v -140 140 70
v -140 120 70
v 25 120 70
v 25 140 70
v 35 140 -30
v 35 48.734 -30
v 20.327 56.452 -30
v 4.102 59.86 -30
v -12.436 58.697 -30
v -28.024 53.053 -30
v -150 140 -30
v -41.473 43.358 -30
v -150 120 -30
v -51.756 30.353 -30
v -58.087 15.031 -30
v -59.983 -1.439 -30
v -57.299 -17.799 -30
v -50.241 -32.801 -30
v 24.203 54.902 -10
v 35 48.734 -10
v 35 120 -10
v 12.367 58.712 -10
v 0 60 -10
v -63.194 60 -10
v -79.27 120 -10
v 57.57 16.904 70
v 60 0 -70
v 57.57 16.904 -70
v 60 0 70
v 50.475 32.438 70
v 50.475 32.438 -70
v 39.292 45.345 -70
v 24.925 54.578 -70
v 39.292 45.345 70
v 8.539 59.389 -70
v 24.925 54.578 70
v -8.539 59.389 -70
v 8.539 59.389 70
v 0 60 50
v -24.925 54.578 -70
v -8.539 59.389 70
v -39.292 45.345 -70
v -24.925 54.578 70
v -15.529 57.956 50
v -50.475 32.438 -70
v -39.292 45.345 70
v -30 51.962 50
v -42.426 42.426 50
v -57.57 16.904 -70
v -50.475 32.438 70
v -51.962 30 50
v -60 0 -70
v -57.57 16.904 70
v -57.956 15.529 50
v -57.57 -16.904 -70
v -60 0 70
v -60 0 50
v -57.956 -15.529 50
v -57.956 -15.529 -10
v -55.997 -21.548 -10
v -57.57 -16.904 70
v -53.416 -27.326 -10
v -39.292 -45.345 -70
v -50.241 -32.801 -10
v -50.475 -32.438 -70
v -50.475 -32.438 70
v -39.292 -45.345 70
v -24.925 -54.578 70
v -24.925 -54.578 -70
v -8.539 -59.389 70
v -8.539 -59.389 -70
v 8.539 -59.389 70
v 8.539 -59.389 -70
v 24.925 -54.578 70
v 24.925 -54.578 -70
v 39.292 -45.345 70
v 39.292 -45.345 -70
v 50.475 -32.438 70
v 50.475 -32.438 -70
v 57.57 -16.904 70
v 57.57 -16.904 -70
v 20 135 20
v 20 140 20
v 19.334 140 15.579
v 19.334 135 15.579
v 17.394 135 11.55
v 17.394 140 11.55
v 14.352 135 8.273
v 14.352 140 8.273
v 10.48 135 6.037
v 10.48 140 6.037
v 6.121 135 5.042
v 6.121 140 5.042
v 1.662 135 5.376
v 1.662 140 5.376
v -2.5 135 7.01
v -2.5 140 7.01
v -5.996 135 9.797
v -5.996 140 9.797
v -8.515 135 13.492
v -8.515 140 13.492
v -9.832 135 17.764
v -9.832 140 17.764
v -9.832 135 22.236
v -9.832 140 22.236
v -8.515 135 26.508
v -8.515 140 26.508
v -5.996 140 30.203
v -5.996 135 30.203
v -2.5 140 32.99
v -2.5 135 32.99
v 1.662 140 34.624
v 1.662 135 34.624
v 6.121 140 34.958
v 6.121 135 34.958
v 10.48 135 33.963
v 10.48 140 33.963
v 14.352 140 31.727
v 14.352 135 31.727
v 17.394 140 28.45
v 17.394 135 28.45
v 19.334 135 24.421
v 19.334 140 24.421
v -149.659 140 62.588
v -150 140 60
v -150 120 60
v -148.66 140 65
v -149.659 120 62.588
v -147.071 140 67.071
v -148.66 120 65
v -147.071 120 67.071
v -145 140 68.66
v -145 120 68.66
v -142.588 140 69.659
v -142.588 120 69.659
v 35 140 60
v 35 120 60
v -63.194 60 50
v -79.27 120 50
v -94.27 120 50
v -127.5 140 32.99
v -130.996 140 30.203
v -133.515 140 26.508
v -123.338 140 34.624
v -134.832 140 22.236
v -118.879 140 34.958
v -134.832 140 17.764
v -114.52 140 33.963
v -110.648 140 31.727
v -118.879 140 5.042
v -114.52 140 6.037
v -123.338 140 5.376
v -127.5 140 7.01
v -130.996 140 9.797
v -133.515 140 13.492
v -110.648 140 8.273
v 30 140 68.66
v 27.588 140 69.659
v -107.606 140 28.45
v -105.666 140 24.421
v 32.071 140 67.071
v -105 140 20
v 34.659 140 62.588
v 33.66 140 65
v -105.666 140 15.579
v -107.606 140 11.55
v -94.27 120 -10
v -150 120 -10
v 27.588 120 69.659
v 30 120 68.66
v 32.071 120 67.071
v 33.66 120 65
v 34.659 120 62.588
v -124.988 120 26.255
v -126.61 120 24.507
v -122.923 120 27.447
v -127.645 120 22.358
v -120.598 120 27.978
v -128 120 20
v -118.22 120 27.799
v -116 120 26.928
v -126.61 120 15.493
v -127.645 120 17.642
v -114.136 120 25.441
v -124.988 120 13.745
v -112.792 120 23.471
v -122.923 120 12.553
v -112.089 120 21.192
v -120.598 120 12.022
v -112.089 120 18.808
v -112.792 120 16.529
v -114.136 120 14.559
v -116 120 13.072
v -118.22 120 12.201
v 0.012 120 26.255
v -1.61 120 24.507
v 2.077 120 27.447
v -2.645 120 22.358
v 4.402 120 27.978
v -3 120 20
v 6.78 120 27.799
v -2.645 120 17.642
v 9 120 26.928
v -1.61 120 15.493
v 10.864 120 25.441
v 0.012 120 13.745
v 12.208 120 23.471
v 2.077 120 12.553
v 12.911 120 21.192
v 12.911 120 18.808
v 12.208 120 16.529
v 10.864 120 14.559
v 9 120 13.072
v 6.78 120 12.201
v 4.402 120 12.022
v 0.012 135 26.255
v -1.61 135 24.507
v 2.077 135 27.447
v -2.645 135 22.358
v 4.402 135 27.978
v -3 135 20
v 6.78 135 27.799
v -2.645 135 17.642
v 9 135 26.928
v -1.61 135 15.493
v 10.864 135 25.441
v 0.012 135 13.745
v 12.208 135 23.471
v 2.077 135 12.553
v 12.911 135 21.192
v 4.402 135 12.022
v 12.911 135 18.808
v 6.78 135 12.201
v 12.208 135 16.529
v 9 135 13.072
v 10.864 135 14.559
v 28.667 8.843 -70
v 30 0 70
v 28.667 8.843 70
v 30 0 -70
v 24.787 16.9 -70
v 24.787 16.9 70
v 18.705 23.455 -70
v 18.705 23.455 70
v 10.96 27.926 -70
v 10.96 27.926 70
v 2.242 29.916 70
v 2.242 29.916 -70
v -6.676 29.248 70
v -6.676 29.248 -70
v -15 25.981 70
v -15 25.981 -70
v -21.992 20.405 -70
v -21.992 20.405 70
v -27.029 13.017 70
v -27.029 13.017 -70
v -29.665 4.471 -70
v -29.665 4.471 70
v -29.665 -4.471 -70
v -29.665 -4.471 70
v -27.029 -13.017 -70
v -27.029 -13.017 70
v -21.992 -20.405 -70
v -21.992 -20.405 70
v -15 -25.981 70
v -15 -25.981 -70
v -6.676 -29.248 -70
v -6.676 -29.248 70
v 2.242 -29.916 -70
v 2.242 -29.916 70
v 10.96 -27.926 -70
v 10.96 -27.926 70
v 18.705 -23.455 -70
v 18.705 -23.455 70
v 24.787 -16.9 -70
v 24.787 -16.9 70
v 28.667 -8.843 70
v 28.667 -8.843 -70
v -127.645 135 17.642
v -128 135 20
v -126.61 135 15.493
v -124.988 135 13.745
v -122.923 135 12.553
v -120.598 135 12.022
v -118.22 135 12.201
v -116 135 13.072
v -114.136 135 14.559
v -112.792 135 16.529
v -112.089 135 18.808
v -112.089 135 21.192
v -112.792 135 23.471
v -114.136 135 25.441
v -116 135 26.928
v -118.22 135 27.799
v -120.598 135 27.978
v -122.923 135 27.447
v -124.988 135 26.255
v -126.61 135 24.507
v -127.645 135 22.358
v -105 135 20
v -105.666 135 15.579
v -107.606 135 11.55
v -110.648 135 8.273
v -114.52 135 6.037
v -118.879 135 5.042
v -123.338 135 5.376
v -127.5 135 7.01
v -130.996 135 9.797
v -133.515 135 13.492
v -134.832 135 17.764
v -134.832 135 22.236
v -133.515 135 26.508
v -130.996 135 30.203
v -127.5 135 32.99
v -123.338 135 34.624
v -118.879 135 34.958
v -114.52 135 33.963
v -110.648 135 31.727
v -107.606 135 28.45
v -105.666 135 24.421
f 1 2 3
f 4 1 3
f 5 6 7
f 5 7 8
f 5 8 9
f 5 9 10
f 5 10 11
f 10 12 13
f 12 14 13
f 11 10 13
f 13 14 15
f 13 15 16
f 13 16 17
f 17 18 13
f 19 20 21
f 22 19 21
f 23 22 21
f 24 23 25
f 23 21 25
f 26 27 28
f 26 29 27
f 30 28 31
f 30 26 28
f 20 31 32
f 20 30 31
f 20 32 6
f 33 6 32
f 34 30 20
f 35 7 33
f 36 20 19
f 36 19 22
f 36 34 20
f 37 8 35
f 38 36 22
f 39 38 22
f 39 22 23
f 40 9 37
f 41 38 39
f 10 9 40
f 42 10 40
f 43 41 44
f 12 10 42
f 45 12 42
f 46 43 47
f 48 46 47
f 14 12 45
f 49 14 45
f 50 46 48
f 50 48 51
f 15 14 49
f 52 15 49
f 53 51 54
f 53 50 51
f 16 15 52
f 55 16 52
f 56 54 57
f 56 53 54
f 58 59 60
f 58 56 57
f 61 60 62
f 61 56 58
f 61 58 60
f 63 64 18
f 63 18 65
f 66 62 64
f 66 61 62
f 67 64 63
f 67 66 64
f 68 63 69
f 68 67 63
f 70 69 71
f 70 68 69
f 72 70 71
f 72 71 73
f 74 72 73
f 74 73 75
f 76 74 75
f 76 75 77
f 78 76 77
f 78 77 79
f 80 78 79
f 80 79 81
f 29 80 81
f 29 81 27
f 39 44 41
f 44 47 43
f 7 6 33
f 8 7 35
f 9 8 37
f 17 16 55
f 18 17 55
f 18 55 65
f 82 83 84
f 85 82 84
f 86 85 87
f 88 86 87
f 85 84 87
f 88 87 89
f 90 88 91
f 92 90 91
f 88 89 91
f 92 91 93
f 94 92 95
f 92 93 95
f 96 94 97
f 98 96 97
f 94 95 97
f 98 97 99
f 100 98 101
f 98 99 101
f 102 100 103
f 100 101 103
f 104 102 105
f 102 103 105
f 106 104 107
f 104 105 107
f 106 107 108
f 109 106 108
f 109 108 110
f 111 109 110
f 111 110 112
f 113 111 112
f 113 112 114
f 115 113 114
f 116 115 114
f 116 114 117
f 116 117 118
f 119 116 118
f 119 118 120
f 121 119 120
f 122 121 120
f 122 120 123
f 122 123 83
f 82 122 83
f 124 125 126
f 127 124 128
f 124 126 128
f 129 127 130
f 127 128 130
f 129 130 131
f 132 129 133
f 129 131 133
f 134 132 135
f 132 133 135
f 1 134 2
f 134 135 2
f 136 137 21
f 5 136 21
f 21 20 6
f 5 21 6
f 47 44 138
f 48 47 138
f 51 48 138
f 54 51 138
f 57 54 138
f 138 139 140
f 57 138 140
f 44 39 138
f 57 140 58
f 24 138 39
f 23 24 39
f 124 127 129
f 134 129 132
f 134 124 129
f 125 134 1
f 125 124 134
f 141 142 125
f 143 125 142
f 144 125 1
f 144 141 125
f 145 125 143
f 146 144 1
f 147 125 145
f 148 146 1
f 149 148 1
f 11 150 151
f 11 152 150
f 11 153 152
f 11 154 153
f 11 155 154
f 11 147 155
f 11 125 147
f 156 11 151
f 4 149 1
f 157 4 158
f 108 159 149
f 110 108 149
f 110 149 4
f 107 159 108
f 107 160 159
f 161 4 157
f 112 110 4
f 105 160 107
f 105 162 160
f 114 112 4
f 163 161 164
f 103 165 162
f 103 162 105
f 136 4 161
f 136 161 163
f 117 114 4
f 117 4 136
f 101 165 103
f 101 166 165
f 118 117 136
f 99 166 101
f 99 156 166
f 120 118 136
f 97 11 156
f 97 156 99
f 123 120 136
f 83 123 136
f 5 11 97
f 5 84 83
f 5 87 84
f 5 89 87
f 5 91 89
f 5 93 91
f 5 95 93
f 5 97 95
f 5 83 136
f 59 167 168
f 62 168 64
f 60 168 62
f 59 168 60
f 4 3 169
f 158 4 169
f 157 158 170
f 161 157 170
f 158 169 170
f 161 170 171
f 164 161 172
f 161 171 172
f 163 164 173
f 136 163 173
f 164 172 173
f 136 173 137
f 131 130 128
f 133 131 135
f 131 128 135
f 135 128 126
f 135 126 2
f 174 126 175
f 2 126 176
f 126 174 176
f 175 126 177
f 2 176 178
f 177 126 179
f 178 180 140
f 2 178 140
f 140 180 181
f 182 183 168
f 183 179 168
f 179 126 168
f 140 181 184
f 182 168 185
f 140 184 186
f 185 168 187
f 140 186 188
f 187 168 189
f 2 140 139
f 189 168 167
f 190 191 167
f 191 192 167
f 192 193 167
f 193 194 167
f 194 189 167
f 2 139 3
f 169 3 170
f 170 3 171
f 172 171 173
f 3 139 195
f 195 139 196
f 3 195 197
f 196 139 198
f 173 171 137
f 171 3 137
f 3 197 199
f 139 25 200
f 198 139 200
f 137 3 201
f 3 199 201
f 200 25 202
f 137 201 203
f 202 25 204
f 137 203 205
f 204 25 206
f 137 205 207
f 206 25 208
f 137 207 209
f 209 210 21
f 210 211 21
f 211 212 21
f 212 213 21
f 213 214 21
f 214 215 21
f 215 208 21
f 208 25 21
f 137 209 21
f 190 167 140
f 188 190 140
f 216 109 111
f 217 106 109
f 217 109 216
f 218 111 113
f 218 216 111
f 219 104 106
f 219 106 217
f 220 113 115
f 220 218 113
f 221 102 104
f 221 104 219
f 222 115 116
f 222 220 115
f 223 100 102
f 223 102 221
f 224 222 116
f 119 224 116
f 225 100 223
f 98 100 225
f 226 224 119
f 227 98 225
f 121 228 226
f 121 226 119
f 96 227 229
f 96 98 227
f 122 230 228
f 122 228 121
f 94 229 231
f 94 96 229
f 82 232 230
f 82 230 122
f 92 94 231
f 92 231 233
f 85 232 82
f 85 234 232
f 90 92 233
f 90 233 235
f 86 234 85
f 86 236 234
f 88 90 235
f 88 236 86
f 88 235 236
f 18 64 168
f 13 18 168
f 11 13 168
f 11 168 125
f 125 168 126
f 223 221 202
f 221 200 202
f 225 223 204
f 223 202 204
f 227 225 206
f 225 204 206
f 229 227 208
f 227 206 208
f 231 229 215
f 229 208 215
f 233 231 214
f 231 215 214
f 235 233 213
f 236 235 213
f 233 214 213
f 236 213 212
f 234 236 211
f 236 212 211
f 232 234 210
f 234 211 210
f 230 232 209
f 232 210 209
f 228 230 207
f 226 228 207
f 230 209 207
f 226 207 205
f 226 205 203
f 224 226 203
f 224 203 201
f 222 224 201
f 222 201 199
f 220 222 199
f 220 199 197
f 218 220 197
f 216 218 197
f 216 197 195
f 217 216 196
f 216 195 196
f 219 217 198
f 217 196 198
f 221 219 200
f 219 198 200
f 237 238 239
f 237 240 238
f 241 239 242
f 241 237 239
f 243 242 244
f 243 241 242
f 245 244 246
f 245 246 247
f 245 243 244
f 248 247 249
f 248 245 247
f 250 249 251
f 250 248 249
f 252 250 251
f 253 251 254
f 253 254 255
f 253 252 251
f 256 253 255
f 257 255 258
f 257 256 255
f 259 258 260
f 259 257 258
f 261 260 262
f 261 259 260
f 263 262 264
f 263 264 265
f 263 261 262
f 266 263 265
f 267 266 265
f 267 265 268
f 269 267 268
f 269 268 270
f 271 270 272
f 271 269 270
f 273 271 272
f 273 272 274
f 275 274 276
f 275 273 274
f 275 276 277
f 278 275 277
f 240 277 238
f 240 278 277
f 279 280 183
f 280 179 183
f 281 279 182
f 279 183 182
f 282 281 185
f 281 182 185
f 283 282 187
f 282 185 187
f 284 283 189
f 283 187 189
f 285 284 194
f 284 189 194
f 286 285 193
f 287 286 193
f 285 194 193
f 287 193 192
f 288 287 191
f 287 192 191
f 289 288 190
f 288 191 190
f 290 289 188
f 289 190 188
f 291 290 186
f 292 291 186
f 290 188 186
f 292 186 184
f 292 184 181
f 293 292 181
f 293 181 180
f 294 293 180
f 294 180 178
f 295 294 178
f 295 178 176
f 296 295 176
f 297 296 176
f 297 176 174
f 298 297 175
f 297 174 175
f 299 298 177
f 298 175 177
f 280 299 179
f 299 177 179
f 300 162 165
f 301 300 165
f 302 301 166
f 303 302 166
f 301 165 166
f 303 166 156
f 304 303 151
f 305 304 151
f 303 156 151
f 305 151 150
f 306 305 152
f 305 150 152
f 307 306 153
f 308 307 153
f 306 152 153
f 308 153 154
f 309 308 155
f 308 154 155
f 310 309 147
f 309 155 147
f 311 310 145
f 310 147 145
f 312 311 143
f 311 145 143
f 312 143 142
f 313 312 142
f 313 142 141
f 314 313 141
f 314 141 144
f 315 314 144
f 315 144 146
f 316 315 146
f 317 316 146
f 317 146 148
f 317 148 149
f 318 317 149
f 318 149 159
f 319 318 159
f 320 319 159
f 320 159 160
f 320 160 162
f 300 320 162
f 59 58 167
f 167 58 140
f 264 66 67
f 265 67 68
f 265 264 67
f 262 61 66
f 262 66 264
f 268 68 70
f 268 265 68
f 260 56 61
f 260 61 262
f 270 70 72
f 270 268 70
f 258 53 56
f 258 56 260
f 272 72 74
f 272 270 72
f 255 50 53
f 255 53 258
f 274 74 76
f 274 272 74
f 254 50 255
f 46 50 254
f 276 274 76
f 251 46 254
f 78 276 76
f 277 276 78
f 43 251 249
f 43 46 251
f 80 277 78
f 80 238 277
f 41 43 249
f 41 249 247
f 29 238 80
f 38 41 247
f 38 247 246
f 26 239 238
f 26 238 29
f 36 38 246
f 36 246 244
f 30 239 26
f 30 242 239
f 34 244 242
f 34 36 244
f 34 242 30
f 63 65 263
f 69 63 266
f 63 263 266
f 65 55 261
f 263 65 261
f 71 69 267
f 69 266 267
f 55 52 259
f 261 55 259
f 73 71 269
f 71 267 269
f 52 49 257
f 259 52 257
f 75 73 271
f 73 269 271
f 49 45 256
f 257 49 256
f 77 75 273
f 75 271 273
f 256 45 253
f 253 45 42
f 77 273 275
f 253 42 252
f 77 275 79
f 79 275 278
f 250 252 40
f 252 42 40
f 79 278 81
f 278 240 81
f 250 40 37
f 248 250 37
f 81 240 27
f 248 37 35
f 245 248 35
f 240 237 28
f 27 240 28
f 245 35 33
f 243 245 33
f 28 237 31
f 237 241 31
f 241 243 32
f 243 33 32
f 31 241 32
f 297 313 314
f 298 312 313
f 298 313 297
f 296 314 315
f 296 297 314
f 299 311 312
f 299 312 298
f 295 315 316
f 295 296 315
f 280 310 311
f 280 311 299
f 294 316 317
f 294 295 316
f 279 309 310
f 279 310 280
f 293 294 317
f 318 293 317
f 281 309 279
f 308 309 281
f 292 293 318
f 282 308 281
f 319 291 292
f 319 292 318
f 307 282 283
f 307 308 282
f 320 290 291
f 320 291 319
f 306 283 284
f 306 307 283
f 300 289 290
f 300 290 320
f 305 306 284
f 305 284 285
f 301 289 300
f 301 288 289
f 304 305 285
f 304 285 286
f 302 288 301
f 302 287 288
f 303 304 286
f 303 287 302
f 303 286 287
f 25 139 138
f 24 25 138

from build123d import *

# Parameters (mm, degrees)
SKETCH1_R                                 = 60
SKETCH1_R_2                               = 30
BOSS_EXTRUDE1_DEPTH                       = 70
BOSS_EXTRUDE4_DEPTH                       = 60
BOSS_EXTRUDE5_DEPTH                       = 20
BOSS_EXTRUDE6_DEPTH                       = 20
CBORE_FOR_M12_HEX_HEAD_SCREW1_D           = 16
CBORE_FOR_M12_HEX_HEAD_SCREW1_DEPTH       = 20
CBORE_FOR_M12_HEX_HEAD_SCREW1_CBORE_D     = 30
CBORE_FOR_M12_HEX_HEAD_SCREW1_CBORE_DEPTH = 5
CBORE_FOR_M12_HEX_HEAD_SCREW1_TIP         = 4.806884952


with BuildPart() as part:
    # Sketch1 → Boss-Extrude1 (new body, symmetric)
    with BuildSketch(Plane.XY):
        Circle(SKETCH1_R)
        Circle(SKETCH1_R_2, mode=Mode.SUBTRACT)
    extrude(amount=BOSS_EXTRUDE1_DEPTH, both=True)

    # Sketch4 → Boss-Extrude4 (add)
    with BuildSketch(Plane.XY.offset(50)):
        with BuildLine():
            Line((-94.270473916, 120), (-79.270473916, 120))
            Line((-79.270473916, 120), (-63.19352237, 60))
            Line((-63.19352237, 60), (0, 60))
            ThreePointArc((0, 60), (-47.601200417, 36.525685741), (-57.955549577, -15.529142706))
            Line((-57.955549577, -15.529142706), (-94.270473916, 120))
        make_face()
    extrude(amount=-BOSS_EXTRUDE4_DEPTH)

    # Sketch7 → Boss-Extrude5 (add)
    with BuildSketch(Plane(origin=(0, 0, -10), x_dir=(-1, 0, 0), z_dir=(0, 0, -1))):
        with BuildLine():
            Line((150, 120), (-35, 120))
            Line((-35, 120), (-35, 48.733971724))
            ThreePointArc((-35, 48.733971724), (41.47341809, 43.358454676), (50.240561153, -32.800701441))
            Line((50.240561153, -32.800701441), (150, 120))
        make_face()
    extrude(amount=BOSS_EXTRUDE5_DEPTH)

    # Sketch8 → Boss-Extrude6 (add)
    with BuildSketch(Plane(origin=(0, 120, 0), x_dir=(1, 0, 0), z_dir=(0, 1, 0))):
        with BuildLine():
            Line((-150, 30), (-150, -60))
            ThreePointArc((-150, -60), (-147.071067812, -67.071067812), (-140, -70))
            Line((-140, -70), (25, -70))
            ThreePointArc((25, -70), (32.071067812, -67.071067812), (35, -60))
            Line((35, -60), (35, 30))
            Line((35, 30), (-150, 30))
        make_face()
    extrude(amount=BOSS_EXTRUDE6_DEPTH)

    # CBORE for M12 Hex Head Screw1
    with Locations(Plane(origin=(0, 140, 0), x_dir=(1, 0, 0), z_dir=(0, 1, 0))):
        with Locations((-120, -20), (5, -20)):
            CounterBoreHole(CBORE_FOR_M12_HEX_HEAD_SCREW1_D / 2, CBORE_FOR_M12_HEX_HEAD_SCREW1_CBORE_D / 2, CBORE_FOR_M12_HEX_HEAD_SCREW1_CBORE_DEPTH, depth=CBORE_FOR_M12_HEX_HEAD_SCREW1_DEPTH)
            with Locations((0, 0, -(CBORE_FOR_M12_HEX_HEAD_SCREW1_DEPTH + CBORE_FOR_M12_HEX_HEAD_SCREW1_TIP / 2))):  # 118° drill point
                Cone(0, CBORE_FOR_M12_HEX_HEAD_SCREW1_D / 2, CBORE_FOR_M12_HEX_HEAD_SCREW1_TIP, mode=Mode.SUBTRACT)


solid = part.part
